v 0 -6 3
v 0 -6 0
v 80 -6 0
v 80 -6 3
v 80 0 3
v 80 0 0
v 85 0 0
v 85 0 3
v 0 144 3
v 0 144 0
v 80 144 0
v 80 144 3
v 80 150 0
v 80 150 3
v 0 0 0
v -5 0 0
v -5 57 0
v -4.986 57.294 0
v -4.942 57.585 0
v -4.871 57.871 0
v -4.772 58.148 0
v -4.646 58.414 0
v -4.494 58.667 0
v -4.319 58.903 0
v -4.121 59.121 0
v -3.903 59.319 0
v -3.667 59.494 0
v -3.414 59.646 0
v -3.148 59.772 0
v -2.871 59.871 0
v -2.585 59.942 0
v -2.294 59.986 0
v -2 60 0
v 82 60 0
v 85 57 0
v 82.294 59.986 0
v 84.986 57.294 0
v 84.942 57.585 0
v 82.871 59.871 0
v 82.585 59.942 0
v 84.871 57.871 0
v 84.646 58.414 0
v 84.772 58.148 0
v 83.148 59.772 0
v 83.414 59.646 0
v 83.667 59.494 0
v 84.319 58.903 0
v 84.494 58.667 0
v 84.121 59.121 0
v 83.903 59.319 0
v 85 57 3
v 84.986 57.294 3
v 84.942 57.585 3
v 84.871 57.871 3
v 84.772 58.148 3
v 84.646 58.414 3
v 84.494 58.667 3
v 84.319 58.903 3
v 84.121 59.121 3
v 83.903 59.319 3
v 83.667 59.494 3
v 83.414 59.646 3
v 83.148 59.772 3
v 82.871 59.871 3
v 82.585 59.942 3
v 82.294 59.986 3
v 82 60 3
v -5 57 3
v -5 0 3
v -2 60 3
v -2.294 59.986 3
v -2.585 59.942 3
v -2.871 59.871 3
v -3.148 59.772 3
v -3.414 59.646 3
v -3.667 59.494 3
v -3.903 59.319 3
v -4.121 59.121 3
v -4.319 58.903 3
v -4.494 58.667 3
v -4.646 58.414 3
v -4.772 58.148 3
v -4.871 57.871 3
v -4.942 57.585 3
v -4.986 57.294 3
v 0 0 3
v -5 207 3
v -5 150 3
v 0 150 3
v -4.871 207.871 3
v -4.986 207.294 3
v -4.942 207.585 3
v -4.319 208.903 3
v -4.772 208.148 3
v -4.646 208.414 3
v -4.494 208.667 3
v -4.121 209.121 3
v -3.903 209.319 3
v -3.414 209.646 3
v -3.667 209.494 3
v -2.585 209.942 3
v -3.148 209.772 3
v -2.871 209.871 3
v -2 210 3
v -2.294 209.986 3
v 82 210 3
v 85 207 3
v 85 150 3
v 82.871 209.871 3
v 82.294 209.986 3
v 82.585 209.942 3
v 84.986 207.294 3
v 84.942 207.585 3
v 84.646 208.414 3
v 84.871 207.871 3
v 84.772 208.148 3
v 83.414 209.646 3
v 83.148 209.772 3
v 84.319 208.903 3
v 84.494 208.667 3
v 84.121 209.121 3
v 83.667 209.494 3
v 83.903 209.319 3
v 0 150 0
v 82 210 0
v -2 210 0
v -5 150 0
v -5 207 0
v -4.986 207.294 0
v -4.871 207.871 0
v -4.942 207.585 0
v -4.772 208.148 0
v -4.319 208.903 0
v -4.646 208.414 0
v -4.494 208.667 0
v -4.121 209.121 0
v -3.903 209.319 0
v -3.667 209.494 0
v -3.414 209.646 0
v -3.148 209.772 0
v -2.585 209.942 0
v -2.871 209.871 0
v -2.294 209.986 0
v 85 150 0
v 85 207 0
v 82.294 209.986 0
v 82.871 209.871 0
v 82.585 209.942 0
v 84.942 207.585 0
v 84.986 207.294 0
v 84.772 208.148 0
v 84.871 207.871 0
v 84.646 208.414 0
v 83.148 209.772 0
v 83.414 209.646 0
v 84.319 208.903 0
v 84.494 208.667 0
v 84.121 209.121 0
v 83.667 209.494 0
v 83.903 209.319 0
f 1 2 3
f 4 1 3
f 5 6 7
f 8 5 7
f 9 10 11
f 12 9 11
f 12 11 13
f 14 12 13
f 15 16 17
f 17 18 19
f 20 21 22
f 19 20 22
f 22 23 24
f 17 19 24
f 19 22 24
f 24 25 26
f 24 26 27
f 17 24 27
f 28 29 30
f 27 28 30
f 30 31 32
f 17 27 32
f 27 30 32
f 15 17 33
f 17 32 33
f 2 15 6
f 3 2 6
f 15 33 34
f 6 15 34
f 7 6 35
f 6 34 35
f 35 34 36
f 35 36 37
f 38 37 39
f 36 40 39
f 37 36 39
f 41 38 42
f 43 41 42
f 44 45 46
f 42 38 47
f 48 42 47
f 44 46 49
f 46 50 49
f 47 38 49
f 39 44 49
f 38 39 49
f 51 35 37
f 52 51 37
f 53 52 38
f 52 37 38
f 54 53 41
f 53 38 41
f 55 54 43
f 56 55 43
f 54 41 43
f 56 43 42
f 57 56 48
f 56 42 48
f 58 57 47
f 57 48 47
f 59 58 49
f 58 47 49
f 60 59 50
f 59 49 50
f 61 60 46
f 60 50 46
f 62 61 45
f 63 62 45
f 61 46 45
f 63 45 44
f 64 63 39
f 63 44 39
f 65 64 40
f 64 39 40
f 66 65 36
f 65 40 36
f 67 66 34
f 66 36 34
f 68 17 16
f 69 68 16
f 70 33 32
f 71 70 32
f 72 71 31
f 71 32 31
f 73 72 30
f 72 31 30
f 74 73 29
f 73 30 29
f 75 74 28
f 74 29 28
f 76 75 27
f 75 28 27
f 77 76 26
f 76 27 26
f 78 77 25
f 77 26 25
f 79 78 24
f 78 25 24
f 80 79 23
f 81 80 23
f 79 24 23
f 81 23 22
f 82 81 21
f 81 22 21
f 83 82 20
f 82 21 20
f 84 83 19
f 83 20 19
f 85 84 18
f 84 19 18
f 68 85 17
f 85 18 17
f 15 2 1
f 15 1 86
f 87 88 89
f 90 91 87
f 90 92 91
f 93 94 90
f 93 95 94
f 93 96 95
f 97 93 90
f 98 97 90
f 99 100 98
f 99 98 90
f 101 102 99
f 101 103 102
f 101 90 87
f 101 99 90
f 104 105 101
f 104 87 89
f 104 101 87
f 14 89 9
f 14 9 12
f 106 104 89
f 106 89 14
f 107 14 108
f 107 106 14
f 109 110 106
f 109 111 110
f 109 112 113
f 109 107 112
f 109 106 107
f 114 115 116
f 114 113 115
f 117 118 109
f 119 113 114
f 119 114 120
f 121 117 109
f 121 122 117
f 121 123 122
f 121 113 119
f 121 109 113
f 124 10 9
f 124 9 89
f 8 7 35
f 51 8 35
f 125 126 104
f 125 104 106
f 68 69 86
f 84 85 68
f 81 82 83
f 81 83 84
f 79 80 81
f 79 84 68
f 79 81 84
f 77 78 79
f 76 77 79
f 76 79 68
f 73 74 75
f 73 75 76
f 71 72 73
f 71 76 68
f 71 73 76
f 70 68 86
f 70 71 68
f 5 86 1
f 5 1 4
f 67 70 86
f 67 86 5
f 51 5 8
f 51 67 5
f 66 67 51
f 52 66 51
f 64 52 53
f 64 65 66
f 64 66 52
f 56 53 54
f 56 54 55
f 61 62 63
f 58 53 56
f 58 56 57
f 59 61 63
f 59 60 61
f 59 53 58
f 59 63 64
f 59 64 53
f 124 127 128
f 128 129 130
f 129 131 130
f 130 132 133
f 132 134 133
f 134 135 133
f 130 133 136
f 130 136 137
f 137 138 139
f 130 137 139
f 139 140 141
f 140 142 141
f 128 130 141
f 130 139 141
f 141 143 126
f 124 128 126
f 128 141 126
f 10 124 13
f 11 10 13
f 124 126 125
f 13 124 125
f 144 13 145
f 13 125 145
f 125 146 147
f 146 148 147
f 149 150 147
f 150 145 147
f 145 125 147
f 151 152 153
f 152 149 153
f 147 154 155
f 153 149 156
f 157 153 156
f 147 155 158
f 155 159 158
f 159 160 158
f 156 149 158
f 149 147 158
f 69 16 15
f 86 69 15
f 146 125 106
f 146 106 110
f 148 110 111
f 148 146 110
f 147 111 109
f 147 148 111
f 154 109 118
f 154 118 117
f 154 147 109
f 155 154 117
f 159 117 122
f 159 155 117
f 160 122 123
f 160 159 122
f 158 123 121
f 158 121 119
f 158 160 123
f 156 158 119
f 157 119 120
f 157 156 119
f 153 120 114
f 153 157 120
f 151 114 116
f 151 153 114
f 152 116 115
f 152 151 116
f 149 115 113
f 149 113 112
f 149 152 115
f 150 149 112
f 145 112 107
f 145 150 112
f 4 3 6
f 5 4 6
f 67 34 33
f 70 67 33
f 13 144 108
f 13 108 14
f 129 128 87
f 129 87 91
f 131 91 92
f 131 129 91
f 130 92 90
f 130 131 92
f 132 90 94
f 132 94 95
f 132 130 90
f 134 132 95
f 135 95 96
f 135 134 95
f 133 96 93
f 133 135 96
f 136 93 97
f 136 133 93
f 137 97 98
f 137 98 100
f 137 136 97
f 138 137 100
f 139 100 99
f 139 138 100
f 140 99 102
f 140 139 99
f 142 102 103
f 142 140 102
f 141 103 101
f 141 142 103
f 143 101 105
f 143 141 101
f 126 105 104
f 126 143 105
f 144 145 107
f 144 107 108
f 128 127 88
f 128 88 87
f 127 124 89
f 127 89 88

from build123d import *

# Parameters (mm, degrees)
SKETCH_1_W      = 80
SKETCH_1_H      = 6
EXTRUDE_1_DEPTH = 3


with BuildPart() as part:
    # 草圖1 → 填料-伸長1 (new body)
    with BuildSketch(Plane.XY):
        with Locations((40, -3)):
            Rectangle(SKETCH_1_W, SKETCH_1_H)
        with BuildLine():
            Line((-5, 0), (85, 0))
            Line((85, 0), (85, 57))
            ThreePointArc((85, 57), (84.121320344, 59.121320344), (82, 60))
            Line((82, 60), (-2, 60))
            ThreePointArc((-2, 60), (-4.121320344, 59.121320344), (-5, 57))
            Line((-5, 57), (-5, 0))
        make_face()
        with Locations((40, 147)):
            Rectangle(SKETCH_1_W, SKETCH_1_H)
        with BuildLine():
            Line((-5, 150), (-5, 207))
            ThreePointArc((-5, 207), (-4.121320344, 209.121320344), (-2, 210))
            Line((-2, 210), (82, 210))
            ThreePointArc((82, 210), (84.121320344, 209.121320344), (85, 207))
            Line((85, 207), (85, 150))
            Line((85, 150), (-5, 150))
        make_face()
    extrude(amount=EXTRUDE_1_DEPTH)


solid = part.part
